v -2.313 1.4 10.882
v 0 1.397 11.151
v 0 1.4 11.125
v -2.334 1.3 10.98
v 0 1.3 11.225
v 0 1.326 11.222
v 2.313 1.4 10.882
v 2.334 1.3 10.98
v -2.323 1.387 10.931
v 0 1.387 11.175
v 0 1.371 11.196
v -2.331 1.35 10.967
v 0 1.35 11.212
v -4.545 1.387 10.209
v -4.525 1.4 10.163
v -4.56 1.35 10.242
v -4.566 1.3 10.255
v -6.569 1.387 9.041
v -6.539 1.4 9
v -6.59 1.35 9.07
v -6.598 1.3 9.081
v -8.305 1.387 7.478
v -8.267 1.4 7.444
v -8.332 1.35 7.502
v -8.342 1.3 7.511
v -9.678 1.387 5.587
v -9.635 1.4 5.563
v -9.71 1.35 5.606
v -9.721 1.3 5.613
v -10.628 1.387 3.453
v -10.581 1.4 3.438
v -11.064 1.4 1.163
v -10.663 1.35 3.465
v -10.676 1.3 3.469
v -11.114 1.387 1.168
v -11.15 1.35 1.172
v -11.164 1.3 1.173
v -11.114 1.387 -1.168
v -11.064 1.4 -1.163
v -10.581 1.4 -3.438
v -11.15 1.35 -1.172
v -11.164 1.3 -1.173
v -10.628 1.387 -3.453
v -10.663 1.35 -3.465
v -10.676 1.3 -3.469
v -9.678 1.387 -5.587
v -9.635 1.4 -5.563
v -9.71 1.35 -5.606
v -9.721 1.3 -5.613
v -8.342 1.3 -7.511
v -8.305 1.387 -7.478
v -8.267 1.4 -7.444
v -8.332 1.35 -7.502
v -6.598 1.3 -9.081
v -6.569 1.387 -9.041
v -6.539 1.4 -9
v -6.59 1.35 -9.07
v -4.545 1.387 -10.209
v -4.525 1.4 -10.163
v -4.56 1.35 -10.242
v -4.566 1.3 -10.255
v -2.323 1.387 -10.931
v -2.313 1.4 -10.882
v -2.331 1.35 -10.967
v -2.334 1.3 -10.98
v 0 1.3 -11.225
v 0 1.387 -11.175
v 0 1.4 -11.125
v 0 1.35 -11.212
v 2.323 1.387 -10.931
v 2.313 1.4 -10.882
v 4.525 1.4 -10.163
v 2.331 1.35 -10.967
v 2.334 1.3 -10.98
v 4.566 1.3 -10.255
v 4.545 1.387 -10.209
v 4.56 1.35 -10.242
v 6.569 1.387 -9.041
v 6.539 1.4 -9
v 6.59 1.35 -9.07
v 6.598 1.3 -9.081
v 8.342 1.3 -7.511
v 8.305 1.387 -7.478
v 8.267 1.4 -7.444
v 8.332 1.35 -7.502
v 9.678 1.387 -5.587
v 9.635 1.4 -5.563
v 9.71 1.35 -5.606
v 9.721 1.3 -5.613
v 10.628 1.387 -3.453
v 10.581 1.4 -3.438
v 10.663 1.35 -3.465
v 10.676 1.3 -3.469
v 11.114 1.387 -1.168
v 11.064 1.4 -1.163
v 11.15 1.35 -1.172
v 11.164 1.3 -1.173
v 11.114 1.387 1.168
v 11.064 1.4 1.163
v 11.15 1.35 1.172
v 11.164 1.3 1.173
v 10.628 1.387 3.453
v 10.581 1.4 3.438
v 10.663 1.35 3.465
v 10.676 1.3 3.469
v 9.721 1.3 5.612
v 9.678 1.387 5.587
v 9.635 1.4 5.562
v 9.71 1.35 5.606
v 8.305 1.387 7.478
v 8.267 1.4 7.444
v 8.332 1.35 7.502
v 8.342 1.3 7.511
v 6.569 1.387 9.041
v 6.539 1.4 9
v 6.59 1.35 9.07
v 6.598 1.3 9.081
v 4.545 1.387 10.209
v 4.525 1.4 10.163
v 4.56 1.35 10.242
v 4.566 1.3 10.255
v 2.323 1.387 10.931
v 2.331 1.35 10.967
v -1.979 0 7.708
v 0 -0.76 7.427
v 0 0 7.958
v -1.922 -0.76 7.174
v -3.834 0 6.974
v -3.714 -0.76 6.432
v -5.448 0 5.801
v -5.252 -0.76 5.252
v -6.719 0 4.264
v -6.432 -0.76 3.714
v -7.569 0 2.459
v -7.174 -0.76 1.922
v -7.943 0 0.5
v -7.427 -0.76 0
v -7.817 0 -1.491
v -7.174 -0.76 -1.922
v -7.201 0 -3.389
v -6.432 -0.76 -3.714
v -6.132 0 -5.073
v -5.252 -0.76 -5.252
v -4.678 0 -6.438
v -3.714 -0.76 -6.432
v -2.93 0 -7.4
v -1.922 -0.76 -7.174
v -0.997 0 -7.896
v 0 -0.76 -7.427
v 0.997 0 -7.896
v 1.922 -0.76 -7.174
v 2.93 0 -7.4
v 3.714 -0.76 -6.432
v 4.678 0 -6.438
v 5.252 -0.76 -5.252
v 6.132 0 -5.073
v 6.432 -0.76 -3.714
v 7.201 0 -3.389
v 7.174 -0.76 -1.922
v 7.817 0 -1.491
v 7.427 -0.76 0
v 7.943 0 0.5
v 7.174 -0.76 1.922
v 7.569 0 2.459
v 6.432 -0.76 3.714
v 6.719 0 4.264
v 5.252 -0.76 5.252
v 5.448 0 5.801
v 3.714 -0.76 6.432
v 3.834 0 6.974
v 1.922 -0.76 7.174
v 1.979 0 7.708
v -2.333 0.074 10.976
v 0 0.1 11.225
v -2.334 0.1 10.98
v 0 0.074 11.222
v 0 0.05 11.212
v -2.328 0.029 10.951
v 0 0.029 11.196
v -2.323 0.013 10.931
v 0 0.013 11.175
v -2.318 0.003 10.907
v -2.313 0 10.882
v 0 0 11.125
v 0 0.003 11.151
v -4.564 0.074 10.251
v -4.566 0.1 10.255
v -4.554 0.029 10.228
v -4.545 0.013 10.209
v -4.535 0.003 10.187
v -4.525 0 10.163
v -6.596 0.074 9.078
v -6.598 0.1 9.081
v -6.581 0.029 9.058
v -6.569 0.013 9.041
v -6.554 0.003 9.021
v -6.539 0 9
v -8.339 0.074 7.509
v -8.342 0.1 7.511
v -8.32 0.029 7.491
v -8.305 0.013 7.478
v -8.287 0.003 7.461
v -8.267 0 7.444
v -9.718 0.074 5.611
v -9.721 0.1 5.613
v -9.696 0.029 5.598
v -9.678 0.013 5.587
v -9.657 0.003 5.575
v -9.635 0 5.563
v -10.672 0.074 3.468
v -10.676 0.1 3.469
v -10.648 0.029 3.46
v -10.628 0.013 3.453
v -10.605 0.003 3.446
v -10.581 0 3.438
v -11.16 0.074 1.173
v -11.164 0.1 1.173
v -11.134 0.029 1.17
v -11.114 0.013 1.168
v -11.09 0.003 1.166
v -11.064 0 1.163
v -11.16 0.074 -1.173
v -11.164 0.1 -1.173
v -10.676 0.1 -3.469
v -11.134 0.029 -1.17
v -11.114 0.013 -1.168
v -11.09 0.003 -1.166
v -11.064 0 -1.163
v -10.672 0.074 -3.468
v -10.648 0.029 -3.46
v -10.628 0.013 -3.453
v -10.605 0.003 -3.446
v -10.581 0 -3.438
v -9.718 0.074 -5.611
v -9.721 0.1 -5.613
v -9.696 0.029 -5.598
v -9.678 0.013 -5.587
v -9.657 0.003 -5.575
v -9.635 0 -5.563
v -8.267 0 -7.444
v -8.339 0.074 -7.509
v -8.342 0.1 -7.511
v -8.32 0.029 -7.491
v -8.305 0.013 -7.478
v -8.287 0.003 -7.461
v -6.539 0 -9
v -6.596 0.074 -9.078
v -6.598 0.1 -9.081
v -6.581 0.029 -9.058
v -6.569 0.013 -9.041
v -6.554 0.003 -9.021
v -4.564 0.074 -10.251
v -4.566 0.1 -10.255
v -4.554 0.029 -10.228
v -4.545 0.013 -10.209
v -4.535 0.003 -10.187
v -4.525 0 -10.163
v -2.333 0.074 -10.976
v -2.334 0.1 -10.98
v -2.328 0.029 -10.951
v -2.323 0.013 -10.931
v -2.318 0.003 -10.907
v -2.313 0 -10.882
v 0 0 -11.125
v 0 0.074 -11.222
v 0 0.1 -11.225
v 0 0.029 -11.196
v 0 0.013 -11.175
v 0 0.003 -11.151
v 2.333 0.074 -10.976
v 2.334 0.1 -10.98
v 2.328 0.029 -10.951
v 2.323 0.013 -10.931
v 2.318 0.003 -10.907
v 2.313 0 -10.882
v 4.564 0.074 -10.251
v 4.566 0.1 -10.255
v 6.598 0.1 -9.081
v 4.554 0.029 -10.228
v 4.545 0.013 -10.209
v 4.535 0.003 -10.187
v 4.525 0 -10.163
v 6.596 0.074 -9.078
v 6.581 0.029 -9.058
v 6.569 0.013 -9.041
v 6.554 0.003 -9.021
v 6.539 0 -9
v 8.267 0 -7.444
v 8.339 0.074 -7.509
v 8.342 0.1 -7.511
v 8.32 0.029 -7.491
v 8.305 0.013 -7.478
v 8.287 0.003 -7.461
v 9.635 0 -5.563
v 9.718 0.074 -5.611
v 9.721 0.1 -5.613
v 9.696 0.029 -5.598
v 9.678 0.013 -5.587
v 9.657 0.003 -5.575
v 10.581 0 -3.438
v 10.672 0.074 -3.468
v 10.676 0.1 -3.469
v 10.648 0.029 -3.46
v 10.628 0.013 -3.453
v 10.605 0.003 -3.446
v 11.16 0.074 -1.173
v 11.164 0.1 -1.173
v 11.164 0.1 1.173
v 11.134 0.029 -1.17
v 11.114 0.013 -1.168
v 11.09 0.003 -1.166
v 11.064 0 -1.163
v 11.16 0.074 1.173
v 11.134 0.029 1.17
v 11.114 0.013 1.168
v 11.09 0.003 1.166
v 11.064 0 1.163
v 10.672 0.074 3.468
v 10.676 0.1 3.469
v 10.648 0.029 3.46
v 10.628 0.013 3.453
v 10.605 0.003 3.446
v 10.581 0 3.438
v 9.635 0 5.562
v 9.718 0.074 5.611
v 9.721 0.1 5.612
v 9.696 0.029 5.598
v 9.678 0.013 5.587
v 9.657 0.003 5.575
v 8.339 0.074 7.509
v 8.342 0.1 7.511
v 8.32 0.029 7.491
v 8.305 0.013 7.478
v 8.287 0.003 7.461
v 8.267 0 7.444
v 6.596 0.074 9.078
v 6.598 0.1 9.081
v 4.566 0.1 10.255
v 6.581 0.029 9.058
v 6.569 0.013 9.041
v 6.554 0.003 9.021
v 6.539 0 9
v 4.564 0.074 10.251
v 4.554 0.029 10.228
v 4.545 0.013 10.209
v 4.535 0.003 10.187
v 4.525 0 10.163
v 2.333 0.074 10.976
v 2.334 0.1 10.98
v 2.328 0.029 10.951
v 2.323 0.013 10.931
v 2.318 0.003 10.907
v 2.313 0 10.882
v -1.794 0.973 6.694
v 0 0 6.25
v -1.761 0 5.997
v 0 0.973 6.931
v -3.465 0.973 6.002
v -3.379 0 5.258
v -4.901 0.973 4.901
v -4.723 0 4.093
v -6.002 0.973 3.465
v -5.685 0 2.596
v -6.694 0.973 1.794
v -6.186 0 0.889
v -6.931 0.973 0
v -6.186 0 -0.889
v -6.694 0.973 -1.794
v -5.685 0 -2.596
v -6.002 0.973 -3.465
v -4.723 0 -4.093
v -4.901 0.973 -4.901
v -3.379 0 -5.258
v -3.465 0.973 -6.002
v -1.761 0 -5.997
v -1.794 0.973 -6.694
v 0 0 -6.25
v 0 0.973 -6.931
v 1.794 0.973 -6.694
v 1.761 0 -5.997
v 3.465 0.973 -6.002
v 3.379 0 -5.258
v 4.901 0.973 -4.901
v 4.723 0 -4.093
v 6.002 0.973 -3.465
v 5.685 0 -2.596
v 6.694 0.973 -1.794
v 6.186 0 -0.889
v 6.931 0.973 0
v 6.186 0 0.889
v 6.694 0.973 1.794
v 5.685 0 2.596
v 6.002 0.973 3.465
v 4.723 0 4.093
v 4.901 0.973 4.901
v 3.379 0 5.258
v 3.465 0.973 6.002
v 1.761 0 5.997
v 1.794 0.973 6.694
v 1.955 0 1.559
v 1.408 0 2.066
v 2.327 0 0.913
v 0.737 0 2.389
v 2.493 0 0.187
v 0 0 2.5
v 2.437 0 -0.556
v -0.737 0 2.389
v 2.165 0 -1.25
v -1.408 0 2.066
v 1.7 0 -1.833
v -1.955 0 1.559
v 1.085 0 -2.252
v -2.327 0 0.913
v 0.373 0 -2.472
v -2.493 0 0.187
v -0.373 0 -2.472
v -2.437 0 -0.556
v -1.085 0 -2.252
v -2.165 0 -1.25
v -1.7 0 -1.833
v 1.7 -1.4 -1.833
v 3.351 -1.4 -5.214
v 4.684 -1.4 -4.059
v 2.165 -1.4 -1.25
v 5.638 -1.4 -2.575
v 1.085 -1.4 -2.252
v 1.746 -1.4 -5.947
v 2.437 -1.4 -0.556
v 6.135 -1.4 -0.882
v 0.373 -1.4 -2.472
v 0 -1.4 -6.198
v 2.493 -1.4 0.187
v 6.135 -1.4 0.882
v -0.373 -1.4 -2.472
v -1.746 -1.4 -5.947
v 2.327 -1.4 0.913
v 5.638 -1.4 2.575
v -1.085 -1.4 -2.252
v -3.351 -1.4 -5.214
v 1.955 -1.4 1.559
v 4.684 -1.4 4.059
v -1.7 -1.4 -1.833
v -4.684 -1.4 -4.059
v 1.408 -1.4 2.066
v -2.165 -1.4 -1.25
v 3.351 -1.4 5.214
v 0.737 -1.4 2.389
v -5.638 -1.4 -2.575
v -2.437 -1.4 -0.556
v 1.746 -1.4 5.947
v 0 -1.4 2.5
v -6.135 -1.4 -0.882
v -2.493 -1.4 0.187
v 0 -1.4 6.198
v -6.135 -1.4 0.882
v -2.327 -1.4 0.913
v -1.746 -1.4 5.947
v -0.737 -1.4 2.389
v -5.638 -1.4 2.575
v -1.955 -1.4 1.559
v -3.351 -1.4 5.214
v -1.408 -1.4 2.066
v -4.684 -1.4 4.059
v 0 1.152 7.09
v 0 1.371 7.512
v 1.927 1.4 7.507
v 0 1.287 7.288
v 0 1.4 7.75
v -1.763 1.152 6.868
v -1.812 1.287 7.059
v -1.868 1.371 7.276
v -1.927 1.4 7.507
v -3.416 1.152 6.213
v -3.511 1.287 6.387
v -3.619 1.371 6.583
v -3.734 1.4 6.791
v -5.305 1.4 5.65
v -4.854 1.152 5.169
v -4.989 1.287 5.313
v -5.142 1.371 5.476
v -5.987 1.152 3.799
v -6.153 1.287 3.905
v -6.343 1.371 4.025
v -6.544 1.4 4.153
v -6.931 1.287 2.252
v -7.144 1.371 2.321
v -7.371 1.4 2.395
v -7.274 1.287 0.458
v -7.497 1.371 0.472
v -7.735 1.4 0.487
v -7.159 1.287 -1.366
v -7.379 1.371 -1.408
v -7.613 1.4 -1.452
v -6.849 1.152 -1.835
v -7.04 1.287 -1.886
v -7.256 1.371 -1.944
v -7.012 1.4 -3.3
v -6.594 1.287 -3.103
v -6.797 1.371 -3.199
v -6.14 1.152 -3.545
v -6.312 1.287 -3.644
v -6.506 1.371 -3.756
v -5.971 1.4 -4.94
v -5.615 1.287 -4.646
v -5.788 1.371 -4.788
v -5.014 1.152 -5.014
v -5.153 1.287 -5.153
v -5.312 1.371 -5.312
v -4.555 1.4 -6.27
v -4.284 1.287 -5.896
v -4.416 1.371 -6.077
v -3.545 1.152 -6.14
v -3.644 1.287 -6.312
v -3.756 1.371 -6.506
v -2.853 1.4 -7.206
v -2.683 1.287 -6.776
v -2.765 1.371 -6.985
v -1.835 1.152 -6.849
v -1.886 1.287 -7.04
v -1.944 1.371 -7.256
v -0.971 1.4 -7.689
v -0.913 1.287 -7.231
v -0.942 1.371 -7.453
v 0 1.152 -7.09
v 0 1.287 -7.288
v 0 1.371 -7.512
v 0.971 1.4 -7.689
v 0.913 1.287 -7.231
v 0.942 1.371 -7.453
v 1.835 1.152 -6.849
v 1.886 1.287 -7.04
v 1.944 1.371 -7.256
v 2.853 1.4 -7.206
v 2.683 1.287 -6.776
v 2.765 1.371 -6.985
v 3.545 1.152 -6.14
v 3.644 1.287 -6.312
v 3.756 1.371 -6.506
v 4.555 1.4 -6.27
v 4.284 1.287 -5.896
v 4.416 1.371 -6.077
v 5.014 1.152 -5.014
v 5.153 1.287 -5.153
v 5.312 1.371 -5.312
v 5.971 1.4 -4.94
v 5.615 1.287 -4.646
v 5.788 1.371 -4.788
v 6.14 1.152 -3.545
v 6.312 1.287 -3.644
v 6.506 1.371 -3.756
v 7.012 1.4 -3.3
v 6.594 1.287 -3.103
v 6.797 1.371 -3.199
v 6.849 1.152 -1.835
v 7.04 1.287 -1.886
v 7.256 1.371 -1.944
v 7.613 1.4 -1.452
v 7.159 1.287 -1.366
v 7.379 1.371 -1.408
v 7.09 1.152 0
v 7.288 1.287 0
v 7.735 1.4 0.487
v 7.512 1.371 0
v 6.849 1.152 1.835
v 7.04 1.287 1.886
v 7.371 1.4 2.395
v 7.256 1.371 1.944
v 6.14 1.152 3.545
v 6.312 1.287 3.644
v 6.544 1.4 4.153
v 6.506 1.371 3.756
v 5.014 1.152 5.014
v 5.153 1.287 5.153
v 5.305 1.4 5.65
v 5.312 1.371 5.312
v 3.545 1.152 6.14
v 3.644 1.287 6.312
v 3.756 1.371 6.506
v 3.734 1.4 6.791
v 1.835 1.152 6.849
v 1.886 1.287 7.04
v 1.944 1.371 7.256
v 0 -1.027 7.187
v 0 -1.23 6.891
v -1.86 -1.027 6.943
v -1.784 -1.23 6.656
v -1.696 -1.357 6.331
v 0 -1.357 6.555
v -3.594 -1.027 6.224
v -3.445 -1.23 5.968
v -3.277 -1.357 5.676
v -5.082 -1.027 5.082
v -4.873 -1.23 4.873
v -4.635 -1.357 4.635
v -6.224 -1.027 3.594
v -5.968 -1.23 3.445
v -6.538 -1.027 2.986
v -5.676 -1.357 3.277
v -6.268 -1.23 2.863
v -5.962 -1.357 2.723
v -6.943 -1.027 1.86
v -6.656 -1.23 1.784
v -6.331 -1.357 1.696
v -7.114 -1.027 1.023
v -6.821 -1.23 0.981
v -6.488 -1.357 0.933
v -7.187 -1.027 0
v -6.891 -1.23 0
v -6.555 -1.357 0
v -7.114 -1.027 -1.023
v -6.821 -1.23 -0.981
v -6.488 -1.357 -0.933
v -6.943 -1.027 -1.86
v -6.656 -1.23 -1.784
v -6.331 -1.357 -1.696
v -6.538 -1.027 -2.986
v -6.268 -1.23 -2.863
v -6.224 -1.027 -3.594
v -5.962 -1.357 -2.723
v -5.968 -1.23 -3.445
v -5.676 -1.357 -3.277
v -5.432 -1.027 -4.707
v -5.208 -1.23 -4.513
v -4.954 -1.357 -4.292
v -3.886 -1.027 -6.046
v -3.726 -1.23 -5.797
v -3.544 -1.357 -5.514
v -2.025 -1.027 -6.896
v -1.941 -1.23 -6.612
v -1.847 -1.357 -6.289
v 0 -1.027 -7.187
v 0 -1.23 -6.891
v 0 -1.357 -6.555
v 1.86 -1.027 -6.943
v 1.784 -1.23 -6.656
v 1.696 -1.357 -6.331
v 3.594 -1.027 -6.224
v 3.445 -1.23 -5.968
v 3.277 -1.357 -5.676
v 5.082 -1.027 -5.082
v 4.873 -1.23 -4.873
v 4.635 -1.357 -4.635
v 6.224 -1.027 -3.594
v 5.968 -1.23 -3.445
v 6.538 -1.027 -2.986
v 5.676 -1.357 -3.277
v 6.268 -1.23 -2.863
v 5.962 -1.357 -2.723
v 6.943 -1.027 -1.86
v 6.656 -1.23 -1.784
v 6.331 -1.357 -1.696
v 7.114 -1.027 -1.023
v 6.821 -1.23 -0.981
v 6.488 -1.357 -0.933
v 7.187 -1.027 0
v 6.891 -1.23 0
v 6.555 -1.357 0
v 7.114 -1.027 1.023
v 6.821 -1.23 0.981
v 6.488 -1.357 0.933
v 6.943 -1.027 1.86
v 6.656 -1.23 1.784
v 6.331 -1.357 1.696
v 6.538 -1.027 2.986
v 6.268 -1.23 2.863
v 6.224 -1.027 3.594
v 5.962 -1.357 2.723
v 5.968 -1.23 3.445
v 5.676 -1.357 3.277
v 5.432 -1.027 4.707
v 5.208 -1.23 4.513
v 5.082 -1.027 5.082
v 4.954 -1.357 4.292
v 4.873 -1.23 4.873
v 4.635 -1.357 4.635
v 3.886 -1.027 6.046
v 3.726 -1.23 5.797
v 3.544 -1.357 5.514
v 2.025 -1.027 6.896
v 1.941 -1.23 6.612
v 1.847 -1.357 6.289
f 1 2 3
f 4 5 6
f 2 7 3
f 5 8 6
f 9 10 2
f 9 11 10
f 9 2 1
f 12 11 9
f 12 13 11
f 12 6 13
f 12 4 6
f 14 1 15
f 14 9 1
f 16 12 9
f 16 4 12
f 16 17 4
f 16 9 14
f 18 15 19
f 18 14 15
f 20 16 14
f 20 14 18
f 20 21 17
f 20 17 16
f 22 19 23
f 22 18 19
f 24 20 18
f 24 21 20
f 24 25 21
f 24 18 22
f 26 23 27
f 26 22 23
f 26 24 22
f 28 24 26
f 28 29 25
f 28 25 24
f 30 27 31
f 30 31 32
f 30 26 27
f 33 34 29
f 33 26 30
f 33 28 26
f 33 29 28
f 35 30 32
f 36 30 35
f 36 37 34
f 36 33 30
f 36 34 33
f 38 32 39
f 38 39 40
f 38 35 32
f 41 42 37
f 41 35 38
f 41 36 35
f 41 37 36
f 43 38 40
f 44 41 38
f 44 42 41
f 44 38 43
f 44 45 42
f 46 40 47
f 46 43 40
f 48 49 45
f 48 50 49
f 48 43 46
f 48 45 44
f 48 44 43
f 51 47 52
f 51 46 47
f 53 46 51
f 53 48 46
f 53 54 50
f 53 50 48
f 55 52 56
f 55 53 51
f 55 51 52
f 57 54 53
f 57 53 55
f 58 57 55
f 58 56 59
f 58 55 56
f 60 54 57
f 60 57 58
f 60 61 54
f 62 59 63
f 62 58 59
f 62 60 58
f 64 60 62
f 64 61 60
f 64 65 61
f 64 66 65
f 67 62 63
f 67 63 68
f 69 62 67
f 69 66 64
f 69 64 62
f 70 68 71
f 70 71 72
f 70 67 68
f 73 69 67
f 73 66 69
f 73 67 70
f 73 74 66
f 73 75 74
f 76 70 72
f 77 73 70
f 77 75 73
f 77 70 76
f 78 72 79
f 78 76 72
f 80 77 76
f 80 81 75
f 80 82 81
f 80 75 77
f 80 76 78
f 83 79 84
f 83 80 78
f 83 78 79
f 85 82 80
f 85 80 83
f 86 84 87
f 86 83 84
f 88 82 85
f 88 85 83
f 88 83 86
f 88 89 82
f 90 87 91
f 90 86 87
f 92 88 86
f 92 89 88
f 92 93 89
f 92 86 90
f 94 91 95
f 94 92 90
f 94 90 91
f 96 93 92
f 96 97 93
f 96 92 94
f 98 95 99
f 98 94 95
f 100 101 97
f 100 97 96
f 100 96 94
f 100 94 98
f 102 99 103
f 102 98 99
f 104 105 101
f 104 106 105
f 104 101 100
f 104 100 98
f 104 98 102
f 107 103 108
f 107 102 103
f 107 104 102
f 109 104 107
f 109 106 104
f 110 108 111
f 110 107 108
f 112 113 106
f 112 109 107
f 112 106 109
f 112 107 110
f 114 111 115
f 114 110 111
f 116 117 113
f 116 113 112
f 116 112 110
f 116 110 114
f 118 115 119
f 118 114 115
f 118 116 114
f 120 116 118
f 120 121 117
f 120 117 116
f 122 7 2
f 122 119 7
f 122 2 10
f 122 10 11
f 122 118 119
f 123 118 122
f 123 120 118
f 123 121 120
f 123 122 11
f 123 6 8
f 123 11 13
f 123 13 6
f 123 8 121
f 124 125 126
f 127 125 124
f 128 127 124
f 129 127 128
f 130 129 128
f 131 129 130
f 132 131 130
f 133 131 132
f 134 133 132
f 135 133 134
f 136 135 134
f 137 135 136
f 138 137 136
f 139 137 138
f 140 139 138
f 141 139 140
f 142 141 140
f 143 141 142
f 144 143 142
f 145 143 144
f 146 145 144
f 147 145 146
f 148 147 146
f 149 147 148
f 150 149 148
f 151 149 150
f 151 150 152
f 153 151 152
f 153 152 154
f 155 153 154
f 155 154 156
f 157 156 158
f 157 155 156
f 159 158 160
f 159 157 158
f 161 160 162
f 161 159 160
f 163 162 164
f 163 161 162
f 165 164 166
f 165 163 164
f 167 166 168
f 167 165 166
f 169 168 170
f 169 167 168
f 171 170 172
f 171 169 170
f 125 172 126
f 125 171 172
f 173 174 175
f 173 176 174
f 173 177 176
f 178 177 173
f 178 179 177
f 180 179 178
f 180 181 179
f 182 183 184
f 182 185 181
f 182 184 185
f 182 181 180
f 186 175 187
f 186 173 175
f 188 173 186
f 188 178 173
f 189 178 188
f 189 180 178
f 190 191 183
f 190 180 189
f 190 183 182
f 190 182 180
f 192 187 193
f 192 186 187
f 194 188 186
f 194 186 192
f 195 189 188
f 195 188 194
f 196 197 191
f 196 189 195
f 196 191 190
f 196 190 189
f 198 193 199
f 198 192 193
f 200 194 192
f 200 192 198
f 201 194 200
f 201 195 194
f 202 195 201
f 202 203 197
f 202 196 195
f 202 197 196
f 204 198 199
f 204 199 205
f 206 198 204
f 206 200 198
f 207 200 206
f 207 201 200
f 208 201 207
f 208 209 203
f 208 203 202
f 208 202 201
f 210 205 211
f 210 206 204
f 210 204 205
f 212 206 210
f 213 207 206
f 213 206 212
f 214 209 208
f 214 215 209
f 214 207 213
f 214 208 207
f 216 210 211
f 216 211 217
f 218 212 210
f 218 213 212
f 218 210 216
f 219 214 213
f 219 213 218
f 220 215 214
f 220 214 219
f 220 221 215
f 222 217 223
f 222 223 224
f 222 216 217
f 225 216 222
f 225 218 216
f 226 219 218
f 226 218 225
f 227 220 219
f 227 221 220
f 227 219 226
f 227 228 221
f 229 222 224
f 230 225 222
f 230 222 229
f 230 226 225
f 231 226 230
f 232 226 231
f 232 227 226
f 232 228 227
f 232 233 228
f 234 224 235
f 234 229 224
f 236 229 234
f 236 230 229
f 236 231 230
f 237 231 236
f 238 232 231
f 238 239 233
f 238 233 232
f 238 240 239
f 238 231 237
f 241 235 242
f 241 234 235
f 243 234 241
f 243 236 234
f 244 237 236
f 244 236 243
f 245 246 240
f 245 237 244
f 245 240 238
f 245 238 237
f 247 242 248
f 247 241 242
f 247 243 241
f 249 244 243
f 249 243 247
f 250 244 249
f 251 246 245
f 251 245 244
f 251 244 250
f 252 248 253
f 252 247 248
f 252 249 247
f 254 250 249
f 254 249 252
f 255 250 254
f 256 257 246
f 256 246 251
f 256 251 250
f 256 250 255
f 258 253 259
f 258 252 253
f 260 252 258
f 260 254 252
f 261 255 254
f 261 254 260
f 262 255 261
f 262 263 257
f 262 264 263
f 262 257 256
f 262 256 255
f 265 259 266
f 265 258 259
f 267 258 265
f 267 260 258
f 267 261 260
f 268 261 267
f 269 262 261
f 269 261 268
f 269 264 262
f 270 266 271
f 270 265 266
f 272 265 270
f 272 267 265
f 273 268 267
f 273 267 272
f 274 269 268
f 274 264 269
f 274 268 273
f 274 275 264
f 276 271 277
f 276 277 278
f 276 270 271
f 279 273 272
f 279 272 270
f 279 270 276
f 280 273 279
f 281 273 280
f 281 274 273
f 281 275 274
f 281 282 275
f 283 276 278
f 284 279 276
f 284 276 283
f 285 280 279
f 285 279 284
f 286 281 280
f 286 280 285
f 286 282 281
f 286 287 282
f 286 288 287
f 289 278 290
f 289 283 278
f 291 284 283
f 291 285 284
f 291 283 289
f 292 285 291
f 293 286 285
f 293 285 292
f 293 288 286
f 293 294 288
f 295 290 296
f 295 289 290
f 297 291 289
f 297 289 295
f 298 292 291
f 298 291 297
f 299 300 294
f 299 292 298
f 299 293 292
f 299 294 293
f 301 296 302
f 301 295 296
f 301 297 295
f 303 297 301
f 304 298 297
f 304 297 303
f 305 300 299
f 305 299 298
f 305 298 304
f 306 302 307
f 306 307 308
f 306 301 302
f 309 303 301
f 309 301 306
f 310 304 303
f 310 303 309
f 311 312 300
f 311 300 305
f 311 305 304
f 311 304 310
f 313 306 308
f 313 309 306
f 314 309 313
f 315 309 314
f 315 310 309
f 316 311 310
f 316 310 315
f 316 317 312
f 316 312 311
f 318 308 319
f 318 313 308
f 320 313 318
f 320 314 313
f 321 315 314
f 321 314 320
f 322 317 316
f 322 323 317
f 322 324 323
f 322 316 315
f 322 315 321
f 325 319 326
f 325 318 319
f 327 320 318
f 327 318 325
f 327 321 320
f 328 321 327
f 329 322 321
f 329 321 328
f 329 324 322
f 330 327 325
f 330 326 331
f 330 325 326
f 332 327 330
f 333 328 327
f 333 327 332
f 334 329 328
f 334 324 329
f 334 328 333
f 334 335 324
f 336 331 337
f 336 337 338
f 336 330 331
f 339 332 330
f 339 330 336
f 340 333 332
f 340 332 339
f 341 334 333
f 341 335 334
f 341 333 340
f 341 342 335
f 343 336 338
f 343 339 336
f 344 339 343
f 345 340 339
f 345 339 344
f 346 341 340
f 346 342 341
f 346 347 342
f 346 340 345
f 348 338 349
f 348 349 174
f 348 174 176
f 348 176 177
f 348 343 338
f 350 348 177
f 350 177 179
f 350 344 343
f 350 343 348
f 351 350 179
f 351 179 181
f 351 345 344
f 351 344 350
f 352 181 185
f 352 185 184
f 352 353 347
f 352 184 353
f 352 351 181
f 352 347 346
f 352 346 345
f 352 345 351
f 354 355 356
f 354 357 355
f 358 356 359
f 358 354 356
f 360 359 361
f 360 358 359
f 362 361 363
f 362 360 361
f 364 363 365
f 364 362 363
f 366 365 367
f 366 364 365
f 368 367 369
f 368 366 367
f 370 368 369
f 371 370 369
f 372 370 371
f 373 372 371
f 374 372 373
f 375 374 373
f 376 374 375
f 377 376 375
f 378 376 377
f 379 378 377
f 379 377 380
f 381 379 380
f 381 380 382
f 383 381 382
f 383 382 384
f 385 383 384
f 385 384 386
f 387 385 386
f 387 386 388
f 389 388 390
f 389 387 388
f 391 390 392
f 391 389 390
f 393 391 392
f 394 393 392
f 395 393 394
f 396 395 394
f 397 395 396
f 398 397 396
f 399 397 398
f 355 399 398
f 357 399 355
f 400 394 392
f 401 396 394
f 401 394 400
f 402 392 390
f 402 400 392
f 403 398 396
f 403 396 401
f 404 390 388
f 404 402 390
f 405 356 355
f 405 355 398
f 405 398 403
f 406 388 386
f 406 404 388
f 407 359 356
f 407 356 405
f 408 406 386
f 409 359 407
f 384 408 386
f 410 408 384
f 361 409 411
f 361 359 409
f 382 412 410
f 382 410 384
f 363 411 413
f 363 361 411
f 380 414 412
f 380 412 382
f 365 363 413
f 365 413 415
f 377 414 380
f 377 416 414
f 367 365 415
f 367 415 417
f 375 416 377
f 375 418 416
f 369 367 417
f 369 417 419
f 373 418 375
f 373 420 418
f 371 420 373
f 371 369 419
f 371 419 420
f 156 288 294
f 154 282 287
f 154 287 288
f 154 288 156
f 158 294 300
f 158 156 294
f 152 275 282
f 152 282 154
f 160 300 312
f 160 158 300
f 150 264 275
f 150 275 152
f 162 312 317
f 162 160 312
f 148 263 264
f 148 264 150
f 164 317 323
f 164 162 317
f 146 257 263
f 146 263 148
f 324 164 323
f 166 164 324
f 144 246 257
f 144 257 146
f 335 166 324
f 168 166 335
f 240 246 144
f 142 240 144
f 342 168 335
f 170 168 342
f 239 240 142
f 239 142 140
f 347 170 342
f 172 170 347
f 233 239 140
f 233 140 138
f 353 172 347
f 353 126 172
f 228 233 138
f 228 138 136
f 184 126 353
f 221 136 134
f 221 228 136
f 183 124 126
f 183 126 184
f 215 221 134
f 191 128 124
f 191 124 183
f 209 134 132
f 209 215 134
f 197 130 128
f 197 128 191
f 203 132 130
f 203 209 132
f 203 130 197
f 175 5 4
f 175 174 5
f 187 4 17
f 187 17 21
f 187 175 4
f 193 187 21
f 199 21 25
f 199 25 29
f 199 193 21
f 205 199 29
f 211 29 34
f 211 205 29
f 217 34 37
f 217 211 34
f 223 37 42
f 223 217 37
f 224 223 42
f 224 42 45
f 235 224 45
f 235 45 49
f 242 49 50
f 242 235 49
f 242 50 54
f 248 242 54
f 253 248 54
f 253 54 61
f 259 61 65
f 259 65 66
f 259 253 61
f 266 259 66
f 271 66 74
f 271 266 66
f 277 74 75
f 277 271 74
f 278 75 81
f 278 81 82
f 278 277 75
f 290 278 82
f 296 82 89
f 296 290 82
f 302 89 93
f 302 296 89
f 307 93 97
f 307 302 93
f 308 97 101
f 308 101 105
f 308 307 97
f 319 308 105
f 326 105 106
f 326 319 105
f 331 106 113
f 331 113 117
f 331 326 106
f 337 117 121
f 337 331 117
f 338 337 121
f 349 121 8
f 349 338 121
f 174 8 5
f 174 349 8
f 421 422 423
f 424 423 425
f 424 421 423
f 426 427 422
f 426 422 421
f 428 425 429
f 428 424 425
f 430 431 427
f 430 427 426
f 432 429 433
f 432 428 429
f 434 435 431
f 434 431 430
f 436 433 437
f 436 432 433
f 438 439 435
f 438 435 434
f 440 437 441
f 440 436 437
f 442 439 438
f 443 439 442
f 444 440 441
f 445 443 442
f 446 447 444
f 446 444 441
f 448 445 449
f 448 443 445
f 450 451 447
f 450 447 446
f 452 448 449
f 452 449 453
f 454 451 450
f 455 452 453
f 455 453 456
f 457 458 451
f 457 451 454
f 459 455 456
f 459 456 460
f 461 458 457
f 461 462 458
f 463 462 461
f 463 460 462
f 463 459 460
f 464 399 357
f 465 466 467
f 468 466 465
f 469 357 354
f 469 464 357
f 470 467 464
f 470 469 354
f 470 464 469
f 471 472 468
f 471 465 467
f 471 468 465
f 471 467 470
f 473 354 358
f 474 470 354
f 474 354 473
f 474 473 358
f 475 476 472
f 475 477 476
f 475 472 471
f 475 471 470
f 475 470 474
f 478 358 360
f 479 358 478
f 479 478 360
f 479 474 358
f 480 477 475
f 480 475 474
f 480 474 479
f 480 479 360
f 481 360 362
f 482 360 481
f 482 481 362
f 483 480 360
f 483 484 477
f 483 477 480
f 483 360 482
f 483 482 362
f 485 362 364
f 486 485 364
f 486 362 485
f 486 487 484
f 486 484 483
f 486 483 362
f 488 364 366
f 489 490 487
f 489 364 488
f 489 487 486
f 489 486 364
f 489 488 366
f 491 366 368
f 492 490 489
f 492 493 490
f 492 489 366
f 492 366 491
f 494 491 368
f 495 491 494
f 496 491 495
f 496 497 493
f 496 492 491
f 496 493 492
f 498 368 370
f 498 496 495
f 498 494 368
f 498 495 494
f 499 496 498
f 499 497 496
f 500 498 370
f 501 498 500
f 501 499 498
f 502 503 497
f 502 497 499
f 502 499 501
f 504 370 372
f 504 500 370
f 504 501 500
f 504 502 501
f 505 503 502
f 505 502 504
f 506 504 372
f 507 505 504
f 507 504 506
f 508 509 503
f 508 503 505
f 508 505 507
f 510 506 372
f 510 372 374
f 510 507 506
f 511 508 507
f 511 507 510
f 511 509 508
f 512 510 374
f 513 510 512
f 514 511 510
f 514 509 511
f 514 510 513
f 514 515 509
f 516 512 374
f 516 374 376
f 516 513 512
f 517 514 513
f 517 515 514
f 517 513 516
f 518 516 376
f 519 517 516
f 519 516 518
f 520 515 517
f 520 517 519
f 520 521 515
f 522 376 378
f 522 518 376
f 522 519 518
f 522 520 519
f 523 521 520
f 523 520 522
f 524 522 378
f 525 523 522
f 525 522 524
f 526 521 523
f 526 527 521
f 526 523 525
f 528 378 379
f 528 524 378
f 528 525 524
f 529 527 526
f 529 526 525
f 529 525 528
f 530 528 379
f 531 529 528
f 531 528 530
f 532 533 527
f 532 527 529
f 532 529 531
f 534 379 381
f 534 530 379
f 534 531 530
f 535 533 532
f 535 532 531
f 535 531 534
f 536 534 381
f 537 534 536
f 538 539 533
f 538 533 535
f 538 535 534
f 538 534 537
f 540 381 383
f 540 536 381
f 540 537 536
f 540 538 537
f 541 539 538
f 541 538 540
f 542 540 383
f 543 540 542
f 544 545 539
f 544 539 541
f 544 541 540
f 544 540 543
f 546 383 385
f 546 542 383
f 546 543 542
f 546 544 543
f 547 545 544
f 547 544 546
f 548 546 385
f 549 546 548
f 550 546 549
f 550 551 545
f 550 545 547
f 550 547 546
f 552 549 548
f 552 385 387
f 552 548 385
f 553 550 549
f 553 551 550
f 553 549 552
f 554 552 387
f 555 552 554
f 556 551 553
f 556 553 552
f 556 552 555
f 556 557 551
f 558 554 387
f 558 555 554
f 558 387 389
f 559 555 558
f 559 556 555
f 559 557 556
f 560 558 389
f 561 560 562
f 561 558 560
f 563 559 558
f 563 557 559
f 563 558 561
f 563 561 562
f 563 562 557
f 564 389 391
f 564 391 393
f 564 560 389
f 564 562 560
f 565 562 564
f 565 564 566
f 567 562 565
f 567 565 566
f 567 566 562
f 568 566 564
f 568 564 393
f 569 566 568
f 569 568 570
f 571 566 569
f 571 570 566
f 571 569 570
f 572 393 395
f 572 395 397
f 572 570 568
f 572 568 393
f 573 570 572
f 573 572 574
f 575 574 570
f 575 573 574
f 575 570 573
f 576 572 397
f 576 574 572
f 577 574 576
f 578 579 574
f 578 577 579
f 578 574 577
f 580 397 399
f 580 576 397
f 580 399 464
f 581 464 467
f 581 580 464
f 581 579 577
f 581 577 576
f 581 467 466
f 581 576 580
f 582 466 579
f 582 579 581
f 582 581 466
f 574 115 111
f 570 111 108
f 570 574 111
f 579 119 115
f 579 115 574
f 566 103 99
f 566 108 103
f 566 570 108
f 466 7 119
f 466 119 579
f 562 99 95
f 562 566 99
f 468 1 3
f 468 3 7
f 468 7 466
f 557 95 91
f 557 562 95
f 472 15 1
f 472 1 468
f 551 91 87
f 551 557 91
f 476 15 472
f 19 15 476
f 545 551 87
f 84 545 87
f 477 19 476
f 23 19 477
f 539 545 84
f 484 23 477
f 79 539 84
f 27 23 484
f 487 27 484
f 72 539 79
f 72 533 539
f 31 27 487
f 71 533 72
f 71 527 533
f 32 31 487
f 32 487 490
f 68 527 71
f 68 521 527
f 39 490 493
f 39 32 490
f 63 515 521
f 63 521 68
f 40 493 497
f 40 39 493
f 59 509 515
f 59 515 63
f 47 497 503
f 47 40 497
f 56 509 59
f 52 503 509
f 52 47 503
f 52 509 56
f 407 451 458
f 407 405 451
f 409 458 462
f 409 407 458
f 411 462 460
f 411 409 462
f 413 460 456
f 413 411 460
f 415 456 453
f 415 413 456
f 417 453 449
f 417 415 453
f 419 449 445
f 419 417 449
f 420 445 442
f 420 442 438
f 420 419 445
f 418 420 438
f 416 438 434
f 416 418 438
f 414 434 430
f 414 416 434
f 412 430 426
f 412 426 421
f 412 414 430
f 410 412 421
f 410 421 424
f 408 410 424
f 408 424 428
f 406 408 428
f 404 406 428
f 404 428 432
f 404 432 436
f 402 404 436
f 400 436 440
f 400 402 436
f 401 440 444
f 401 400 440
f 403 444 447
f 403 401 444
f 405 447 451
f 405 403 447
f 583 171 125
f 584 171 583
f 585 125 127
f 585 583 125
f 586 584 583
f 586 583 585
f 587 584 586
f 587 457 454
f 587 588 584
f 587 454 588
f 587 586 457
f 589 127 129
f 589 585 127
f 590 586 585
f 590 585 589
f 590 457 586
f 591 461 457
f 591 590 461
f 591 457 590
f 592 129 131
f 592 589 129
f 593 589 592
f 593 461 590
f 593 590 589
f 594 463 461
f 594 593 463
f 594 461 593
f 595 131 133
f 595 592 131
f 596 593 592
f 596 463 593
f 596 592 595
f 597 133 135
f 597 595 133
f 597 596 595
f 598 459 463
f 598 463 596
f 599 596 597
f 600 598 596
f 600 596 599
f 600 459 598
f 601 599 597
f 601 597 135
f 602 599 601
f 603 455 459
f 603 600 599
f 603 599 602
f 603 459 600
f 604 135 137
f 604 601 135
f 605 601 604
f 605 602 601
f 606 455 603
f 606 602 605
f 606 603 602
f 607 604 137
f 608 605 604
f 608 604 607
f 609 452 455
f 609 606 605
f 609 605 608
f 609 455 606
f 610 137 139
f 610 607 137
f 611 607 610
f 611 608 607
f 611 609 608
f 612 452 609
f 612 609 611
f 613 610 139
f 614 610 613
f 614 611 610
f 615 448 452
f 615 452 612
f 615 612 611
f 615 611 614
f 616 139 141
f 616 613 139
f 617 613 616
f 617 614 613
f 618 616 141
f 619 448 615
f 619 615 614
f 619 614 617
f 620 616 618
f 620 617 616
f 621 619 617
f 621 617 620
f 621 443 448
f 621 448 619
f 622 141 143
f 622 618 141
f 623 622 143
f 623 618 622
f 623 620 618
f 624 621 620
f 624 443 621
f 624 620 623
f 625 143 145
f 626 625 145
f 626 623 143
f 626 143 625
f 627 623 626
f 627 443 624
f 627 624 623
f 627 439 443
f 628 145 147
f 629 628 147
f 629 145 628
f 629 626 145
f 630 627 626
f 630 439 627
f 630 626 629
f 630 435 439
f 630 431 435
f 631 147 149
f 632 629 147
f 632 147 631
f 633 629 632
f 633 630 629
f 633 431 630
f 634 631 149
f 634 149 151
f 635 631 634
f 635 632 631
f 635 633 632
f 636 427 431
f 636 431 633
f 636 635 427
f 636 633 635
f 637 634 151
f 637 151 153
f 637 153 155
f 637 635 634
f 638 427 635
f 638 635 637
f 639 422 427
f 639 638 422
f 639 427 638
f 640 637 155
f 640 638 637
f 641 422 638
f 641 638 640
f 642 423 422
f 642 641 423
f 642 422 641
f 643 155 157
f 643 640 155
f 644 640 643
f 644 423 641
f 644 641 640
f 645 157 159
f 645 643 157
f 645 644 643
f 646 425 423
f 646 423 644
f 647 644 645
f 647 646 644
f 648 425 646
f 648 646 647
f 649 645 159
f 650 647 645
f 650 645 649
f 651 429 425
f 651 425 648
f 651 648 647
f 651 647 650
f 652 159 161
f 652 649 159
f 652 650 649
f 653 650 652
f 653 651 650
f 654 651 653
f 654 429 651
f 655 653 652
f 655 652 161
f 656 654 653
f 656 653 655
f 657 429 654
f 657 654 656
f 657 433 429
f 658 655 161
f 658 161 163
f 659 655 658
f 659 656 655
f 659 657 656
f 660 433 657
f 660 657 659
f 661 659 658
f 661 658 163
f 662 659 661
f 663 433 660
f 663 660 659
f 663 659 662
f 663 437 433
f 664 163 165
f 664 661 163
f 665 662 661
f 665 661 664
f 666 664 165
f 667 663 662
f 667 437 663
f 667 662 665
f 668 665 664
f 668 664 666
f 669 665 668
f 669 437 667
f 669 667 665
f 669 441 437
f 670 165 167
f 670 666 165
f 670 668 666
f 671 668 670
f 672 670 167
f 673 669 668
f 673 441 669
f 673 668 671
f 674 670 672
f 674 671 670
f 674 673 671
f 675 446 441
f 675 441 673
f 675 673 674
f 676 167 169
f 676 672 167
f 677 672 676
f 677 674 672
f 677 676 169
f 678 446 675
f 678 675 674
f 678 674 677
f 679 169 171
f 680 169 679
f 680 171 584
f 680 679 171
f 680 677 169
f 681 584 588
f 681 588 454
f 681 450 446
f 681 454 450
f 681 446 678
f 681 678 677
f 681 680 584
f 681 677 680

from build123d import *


with BuildPart() as part:
    # Sketch1 → Revolve1 (revolve)
    with BuildSketch(Plane.XY, mode=Mode.PRIVATE) as revolve1_sk:
        with BuildLine():
            Line((2.5, 0), (6.25, 0))
            Line((6.25, 0), (6.930508845, 0.973091831))
            ThreePointArc((6.930508845, 0.973091831), (7.287989086, 1.286874239), (7.75, 1.4))
            Line((7.75, 1.4), (11.125, 1.4))
            ThreePointArc((11.125, 1.4), (11.195710678, 1.370710678), (11.225, 1.3))
            Line((11.225, 1.3), (11.225, 0.1))
            ThreePointArc((11.225, 0.1), (11.195710678, 0.029289322), (11.125, 0))
            Line((11.125, 0), (7.958377194, 0))
            Line((7.958377194, 0), (7.427142434, -0.759637747))
            ThreePointArc((7.427142434, -0.759637747), (6.890922072, -1.230311358), (6.197905701, -1.4))
            Line((6.197905701, -1.4), (2.5, -1.4))
            Line((2.5, -1.4), (2.5, 0))
        make_face()
    revolve(revolve1_sk.sketch.rotate(Axis((0, 11.539064392, 0), (0, -1, 0)), 90), axis=Axis((0, 11.539064392, 0), (0, -1, 0)))


solid = part.part
